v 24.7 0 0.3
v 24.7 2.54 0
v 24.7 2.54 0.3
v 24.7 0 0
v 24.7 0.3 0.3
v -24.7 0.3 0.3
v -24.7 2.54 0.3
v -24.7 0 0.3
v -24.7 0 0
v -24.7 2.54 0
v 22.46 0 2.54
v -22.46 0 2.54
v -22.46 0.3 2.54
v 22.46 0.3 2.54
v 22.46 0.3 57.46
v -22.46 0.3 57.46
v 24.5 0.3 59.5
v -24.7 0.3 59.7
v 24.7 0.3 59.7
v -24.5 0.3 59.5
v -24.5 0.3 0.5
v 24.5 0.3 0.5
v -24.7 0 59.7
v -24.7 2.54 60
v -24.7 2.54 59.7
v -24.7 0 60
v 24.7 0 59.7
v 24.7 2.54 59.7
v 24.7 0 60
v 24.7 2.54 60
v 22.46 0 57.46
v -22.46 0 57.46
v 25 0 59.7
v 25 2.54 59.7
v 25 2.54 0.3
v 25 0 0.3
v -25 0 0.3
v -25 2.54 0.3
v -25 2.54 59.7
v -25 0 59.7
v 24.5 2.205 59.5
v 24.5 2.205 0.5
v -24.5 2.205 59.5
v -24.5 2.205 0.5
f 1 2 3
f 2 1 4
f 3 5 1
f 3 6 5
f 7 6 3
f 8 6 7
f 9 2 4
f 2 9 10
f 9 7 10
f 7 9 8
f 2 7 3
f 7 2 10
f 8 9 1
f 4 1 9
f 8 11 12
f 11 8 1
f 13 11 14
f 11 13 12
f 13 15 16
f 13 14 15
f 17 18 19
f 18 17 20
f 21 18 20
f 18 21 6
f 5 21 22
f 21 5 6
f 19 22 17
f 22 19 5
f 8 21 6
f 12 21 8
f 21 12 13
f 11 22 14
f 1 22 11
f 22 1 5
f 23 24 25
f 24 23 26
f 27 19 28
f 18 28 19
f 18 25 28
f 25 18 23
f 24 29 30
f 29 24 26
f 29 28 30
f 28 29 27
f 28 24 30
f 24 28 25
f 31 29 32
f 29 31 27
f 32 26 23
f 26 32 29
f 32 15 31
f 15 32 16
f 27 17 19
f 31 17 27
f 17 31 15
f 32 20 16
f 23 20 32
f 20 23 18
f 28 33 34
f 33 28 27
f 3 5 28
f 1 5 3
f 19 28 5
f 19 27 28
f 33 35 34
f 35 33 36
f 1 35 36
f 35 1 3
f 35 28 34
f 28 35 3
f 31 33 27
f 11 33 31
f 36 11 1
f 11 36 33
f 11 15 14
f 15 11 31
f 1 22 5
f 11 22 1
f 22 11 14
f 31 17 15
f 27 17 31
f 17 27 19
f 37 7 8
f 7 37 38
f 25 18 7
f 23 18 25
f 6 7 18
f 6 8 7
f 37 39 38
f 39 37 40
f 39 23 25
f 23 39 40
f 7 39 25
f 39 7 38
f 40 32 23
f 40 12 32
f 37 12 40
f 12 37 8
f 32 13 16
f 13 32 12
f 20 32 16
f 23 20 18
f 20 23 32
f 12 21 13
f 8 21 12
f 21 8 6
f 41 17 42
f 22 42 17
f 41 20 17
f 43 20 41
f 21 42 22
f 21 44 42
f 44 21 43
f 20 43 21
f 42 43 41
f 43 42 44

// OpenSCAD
// file: Lprofile.scad
module lprofile(length=100, width=2, thickness=0.5, angle45=true) 
{
    cut_depth = angle45 ? (width-thickness) : 0;
    l = angle45 ? (length-2*thickness) : length;

    color([0.9,0.3,0.3])
    translate([0,width/2,thickness/2])
    cube([l, width, thickness], center=true);
    
    color([0.9,0.3,0.3])
    translate([-l/2,thickness,0])
    rotate([90,0,0])
    linear_extrude(thickness) 
    polygon(points=[[0, 0],[0,thickness],[cut_depth,width],
        [l-cut_depth,width],[l,thickness],[l,0],
        [0,0]]);
}

lprofile();
// main file
use <Lprofile.scad>

module windowblind(height=60, width=50, lprofile_width=2.54, lprofile_thickness=0.3,explode=false) 
{
    playwood_thickness = 0.75*2.54;
    plawood_allowance = 0.2;
    playwood_width = width - 2.0 * (lprofile_thickness + plawood_allowance);
    playwood_height = height - 2.0 * (lprofile_thickness + plawood_allowance);
    explo_dist = explode ? 8 : 0;
    
    translate([0,0,-explo_dist])
    lprofile(width, lprofile_width, lprofile_thickness, true) ;

    translate([0,0,height+explo_dist])
    rotate([180,0,180])
    lprofile(width, lprofile_width, lprofile_thickness, true) ;

    translate([width/2+explo_dist,0,height/2])
    rotate([0,270,0])
    lprofile(height, lprofile_width, lprofile_thickness, true) ;
    
    translate([-width/2-explo_dist,0,height/2])
    rotate([0,90,0])
    lprofile(height, lprofile_width, lprofile_thickness, true) ;

    color([0.8, 0.8, 0.0, 0.7])
    translate([0,lprofile_thickness+playwood_thickness/2,height/2])
    cube([playwood_width, playwood_thickness, playwood_height], center = true);
}

windowblind();
